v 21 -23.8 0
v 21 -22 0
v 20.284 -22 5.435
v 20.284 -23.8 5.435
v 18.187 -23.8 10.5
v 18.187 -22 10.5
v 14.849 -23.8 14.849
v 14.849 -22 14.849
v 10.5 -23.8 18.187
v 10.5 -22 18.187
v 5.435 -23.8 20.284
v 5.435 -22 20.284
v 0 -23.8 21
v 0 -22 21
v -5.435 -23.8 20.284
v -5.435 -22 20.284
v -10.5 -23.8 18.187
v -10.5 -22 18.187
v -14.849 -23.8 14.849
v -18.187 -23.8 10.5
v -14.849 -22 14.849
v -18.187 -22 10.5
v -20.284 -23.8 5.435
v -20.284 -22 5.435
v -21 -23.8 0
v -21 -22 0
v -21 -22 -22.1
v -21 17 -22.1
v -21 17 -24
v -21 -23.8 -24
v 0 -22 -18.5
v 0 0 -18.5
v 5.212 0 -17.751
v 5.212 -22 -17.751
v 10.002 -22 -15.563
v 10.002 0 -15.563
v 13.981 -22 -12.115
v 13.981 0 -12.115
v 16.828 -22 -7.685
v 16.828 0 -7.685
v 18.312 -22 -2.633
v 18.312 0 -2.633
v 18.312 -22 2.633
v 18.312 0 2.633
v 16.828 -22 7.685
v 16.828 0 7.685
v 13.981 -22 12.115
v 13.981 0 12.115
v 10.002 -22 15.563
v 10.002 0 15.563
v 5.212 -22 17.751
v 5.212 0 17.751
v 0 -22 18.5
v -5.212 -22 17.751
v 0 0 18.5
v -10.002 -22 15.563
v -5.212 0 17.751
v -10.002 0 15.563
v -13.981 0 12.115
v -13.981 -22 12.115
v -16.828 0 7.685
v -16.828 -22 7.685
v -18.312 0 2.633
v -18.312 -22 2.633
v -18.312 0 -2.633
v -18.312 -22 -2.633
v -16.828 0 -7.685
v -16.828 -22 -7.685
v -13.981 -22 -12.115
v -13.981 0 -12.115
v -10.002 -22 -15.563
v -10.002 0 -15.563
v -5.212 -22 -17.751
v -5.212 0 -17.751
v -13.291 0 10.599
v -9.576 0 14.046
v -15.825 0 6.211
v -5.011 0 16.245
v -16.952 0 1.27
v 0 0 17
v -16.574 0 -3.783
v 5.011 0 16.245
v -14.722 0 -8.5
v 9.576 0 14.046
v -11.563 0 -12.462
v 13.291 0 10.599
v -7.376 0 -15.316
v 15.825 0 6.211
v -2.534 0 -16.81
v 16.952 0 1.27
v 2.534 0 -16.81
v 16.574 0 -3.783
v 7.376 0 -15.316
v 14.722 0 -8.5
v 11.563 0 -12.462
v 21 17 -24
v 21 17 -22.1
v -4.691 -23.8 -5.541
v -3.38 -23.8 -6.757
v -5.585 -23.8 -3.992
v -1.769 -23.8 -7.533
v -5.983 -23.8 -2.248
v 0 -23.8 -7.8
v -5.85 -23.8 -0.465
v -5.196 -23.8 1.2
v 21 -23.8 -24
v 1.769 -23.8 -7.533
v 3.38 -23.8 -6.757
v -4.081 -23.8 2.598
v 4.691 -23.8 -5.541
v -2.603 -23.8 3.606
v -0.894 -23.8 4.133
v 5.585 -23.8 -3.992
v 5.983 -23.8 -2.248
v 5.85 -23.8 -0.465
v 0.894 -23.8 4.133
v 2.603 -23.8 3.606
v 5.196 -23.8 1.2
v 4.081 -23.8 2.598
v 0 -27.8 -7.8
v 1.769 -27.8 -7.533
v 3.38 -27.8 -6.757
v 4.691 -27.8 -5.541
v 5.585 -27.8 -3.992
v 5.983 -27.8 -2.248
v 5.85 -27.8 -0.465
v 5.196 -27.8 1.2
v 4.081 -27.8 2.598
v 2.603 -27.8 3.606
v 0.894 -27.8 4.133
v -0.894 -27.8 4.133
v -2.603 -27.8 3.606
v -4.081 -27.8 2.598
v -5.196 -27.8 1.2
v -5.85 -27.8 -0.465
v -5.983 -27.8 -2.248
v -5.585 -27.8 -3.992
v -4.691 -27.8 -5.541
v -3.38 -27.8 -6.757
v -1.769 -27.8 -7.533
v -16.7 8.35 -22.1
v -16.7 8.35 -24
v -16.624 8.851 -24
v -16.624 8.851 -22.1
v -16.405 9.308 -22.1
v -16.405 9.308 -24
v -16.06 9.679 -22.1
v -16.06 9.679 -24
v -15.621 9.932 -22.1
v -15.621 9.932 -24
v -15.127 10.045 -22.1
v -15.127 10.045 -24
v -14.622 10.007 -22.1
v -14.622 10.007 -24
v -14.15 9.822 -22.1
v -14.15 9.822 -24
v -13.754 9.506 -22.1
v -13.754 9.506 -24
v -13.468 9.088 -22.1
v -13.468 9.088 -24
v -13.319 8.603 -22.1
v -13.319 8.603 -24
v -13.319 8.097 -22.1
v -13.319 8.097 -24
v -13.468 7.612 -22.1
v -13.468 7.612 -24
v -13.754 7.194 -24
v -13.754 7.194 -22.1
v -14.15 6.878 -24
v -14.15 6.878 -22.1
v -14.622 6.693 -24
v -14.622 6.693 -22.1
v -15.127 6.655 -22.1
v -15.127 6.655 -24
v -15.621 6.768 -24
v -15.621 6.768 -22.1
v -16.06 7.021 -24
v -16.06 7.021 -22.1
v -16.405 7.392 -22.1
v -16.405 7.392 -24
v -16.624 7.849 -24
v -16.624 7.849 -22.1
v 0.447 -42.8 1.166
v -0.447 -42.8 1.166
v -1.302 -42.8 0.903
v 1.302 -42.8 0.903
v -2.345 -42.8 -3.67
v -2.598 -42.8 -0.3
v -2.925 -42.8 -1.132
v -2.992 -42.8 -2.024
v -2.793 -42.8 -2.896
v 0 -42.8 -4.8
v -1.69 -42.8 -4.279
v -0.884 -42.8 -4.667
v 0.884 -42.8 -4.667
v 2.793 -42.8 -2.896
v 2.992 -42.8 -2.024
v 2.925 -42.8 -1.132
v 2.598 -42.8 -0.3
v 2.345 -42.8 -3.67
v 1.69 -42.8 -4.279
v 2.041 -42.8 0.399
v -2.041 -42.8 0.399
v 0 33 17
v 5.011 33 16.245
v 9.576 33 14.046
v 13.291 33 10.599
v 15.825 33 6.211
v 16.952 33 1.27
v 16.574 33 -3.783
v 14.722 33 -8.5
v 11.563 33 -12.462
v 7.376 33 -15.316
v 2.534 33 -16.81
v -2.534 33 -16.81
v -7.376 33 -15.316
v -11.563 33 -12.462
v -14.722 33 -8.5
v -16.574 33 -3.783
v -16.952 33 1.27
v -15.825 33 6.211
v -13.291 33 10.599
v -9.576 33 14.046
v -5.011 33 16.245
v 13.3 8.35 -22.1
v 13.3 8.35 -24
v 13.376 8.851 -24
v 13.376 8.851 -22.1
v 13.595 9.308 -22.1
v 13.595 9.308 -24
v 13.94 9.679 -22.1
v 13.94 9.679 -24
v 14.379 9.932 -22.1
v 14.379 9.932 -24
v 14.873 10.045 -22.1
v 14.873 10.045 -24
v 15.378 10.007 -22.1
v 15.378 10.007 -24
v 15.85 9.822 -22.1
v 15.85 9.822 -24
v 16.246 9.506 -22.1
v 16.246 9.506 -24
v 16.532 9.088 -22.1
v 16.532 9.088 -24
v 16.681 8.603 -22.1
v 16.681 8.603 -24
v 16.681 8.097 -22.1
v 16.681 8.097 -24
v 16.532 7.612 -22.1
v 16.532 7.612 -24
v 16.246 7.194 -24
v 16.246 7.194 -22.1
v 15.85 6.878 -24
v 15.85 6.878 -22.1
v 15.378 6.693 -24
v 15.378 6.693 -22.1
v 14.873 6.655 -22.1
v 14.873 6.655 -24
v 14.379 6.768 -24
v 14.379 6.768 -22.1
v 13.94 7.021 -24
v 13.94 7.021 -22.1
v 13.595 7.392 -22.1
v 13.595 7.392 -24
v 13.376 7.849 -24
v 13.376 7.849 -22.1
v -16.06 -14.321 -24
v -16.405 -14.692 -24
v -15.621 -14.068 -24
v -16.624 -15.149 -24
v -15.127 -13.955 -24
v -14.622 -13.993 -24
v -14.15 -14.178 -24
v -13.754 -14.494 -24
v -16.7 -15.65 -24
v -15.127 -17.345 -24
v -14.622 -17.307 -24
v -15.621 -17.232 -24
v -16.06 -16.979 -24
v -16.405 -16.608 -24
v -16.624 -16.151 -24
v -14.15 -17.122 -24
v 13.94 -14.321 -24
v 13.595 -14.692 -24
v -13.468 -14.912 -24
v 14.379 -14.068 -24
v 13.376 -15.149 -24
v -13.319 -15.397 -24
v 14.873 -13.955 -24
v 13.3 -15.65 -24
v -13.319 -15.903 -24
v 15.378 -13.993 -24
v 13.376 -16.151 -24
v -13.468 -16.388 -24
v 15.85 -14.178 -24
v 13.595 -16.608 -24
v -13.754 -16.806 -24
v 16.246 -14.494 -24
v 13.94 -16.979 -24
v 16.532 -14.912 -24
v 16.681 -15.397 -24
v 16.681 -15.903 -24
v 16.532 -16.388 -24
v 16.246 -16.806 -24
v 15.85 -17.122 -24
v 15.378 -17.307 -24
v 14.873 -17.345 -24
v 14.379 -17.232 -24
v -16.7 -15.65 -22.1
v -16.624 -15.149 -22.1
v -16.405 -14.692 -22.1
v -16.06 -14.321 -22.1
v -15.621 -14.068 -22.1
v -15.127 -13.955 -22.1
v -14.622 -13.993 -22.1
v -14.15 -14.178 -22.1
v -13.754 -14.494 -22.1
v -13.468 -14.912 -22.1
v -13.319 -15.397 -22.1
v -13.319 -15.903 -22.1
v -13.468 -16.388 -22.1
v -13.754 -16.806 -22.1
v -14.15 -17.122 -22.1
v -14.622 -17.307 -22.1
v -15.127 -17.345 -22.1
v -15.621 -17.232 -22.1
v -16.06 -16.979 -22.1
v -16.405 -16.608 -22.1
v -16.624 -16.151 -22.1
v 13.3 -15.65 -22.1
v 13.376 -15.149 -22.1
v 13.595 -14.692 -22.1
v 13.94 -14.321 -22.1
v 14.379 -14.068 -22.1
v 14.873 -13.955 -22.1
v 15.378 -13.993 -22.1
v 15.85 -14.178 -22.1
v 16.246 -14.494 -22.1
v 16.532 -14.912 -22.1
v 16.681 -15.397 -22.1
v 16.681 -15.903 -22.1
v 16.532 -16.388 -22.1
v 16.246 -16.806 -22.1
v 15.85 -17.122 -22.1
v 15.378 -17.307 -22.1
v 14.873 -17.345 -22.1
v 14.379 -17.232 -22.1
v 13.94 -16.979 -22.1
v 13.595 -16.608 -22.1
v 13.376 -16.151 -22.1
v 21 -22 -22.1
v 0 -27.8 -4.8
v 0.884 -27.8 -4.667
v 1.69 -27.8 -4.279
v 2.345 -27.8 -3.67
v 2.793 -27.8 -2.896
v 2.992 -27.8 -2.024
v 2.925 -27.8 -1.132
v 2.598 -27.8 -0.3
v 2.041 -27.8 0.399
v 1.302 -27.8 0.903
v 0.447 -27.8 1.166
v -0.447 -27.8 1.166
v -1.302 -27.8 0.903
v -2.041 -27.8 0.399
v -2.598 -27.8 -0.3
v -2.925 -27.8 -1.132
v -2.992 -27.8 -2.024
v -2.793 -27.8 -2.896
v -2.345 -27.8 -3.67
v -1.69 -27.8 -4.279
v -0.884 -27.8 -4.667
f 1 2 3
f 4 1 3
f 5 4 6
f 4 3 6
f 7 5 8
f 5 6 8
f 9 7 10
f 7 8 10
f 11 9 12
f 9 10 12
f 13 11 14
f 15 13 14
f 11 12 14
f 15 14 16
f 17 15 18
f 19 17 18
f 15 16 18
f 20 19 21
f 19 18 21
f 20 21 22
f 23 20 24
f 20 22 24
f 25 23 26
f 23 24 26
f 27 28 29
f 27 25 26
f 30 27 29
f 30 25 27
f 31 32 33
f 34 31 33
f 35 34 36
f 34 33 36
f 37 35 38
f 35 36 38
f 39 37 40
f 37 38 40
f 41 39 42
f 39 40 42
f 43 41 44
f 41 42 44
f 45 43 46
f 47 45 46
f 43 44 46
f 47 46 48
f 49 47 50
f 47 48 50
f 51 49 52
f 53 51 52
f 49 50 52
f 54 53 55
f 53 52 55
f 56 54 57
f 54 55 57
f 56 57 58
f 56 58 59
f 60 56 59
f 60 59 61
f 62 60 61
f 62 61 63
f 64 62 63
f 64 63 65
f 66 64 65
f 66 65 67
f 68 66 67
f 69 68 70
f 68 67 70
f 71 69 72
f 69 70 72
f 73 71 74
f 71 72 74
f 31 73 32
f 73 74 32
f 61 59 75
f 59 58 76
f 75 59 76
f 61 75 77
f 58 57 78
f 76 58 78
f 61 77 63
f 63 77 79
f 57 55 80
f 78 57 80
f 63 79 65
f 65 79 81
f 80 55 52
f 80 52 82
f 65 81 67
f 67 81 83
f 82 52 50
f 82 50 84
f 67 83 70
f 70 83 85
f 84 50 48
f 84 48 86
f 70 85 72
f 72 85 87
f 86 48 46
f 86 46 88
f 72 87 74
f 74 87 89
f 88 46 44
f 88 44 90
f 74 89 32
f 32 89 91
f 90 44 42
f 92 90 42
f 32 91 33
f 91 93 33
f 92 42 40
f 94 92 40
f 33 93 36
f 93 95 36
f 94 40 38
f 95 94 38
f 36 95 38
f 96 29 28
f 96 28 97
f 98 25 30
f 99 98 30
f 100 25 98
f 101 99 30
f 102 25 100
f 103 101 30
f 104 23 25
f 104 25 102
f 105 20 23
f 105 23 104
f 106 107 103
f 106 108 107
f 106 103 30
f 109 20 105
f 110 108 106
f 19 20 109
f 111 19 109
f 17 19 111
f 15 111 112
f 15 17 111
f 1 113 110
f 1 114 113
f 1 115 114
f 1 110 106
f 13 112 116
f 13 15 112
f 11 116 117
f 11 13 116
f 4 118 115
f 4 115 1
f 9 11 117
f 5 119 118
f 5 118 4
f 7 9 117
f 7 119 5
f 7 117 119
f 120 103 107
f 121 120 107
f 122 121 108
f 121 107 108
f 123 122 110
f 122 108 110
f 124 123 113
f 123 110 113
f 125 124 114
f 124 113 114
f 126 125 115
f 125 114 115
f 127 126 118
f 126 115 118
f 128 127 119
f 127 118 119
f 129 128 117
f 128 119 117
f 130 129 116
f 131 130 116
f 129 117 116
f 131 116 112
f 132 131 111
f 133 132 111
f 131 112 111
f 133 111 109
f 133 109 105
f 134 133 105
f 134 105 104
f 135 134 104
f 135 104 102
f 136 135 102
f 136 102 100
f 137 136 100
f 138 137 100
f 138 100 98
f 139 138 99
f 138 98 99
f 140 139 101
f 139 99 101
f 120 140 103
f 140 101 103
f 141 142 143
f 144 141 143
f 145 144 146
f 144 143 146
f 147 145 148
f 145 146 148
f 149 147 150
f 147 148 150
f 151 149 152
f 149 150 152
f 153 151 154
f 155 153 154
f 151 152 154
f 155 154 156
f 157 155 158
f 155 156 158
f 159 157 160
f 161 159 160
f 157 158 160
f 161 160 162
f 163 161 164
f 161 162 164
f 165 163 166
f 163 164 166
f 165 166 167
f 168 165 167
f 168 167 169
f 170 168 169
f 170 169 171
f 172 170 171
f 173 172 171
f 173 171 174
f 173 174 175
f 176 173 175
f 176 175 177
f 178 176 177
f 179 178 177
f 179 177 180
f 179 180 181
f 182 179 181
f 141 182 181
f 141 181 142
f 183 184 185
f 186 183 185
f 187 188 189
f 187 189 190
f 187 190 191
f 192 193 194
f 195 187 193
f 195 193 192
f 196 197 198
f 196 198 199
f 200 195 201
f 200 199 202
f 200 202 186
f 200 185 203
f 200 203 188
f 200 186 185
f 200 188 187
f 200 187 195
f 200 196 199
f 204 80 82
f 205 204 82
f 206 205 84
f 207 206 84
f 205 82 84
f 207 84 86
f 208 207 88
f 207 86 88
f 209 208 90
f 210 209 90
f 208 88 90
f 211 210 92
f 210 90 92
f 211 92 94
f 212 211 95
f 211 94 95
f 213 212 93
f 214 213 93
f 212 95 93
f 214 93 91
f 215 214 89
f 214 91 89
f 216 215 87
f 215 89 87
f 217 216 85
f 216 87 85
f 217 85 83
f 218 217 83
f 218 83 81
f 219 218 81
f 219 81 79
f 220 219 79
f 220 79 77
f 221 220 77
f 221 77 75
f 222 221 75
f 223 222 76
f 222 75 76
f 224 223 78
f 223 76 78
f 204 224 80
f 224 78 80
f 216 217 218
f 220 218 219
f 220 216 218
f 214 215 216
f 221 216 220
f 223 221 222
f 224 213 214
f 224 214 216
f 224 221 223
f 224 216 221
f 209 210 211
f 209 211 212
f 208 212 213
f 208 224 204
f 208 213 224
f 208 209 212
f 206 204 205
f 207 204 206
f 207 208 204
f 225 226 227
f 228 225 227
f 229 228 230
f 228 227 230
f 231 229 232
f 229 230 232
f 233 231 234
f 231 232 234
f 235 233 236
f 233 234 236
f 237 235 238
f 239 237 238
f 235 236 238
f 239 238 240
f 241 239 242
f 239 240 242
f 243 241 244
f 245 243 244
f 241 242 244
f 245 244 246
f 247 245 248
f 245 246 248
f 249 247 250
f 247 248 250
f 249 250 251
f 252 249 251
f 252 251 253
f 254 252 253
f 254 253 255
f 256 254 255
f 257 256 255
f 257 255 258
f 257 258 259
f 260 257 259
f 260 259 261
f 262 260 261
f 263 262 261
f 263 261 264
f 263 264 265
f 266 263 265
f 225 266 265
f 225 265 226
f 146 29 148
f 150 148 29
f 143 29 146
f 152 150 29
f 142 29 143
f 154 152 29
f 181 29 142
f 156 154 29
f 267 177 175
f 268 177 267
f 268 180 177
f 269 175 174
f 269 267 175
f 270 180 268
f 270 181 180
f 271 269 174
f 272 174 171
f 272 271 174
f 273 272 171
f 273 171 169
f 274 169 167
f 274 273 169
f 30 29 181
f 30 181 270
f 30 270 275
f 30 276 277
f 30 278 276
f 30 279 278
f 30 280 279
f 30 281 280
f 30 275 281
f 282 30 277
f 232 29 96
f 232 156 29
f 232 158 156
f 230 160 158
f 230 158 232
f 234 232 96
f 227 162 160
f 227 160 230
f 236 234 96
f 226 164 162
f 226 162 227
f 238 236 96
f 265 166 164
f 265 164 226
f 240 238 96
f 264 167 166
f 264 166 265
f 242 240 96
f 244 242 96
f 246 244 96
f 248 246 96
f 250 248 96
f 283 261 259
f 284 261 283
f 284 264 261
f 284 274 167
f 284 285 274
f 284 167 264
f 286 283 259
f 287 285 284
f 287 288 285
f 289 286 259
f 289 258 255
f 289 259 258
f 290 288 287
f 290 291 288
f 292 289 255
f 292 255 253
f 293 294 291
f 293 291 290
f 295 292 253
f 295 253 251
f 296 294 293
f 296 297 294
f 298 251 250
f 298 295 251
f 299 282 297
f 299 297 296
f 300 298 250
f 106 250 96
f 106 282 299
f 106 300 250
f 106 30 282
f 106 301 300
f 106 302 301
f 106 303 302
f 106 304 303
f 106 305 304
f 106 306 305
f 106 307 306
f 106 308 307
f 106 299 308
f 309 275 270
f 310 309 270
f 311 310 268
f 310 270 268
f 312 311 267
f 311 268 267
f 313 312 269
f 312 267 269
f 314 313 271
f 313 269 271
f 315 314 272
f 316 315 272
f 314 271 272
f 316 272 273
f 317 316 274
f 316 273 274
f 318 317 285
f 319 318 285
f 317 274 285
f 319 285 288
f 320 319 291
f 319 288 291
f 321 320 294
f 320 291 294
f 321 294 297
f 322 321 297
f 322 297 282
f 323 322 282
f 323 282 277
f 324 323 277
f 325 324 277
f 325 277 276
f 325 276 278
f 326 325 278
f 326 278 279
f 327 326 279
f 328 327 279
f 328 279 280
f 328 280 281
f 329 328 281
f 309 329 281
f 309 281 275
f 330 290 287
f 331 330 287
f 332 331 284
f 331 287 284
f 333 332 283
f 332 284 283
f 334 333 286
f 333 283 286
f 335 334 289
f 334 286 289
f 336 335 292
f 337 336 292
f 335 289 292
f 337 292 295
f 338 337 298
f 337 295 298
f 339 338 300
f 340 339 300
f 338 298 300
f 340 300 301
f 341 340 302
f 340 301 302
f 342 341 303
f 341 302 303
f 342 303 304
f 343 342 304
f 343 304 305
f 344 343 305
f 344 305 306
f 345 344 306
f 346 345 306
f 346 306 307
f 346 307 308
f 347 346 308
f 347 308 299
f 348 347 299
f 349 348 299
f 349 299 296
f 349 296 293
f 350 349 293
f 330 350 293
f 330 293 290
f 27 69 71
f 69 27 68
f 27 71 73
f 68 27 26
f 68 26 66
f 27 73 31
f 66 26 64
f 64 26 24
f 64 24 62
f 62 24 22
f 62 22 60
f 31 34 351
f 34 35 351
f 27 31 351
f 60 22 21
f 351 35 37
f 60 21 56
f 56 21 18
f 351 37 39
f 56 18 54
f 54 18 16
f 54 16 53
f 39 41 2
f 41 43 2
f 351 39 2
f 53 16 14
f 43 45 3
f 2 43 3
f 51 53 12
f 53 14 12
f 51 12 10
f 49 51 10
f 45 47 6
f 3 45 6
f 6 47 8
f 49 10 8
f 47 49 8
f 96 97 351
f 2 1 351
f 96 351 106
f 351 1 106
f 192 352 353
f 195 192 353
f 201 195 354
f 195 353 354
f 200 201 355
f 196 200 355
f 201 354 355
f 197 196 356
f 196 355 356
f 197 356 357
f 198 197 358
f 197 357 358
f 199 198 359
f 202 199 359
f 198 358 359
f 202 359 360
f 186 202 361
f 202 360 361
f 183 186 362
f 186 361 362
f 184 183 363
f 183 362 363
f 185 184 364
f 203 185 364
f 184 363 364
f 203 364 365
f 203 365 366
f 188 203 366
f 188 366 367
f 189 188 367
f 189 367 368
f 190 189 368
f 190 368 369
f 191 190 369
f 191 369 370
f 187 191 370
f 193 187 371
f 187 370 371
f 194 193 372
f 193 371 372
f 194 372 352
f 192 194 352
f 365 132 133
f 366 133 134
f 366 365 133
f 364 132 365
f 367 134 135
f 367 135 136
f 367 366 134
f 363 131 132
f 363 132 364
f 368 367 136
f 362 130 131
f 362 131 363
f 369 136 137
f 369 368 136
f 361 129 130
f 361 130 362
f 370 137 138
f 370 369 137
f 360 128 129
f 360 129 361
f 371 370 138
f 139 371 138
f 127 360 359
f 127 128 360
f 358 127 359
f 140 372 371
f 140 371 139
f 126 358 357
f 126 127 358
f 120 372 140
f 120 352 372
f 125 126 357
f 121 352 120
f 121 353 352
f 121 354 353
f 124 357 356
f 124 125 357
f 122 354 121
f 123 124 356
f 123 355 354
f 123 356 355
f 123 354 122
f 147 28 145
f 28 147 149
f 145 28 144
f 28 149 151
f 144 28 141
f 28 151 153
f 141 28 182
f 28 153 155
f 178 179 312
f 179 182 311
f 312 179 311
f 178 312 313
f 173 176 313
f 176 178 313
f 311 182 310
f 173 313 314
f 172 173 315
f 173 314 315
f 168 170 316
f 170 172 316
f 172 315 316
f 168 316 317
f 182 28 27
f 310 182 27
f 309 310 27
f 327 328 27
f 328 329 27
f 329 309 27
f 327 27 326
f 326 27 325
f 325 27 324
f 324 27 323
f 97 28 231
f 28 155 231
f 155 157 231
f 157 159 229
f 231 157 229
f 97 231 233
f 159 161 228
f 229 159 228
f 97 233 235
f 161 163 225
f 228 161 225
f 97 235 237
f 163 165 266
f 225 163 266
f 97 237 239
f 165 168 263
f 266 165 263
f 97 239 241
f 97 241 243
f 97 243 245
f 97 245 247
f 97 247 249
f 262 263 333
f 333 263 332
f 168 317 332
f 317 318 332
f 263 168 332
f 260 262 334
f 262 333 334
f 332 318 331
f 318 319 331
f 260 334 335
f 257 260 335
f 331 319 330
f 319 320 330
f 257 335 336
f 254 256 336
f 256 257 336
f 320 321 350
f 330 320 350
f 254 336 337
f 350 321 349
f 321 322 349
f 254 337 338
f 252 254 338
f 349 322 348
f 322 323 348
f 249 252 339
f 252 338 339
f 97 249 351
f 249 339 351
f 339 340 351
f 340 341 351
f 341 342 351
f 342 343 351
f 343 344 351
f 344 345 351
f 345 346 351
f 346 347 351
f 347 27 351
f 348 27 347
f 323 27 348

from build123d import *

# Parameters (mm, degrees)
SKETCH_1_R          = 17
EXTRUDE_1_DEPTH     = 33
SKETCH_2_R          = 18.5
EXTRUDE_2_DEPTH     = 22
EXTRUDE_3_DEPTH     = 1.8
SKETCH_4_W          = 42
SKETCH_4_H          = 1.9
EXTRUDE_4_DEPTH     = 39
SKETCH_5_R          = 6
EXTRUDE_5_DEPTH     = 4
SKETCH_6_R          = 3
EXTRUDE_6_DEPTH     = 15
CUT_EXTRUDE_1_REACH = 67.558
SKETCH_7_R          = 1.7


with BuildPart() as part:
    # 草图1 → 凸台-拉伸1 (new body)
    with BuildSketch(Plane(origin=(0, 0, 0), x_dir=(1, 0, 0), z_dir=(0, 1, 0))):
        with Locations(Location((0, 0, 0), (0, 0, 270))):
            Circle(SKETCH_1_R)
    extrude(amount=EXTRUDE_1_DEPTH)

    # 草图2 → 凸台-拉伸2 (add)
    with BuildSketch(Plane.XZ):
        with Locations(Location((0, 0, 0), (0, 0, 270))):
            Circle(SKETCH_2_R)
    extrude(amount=EXTRUDE_2_DEPTH)

    # 草图3 → 凸台-拉伸3 (add)
    with BuildSketch(Plane.XZ.offset(22)):
        with BuildLine():
            Line((-21, 0), (-21, -24))
            Line((-21, -24), (21, -24))
            Line((21, -24), (21, 0))
            ThreePointArc((21, 0), (0, 21), (-21, 0))
        make_face()
    extrude(amount=EXTRUDE_3_DEPTH)

    # 草图4 → 凸台-拉伸4 (add)
    with BuildSketch(Plane(origin=(0, -22, 0), x_dir=(1, 0, 0), z_dir=(0, 1, 0))):
        with Locations((0, 23.05)):
            Rectangle(SKETCH_4_W, SKETCH_4_H)
    extrude(amount=EXTRUDE_4_DEPTH)

    # 草图5 → 凸台-拉伸5 (add)
    with BuildSketch(Plane.XZ.offset(23.8)):
        with Locations(Location((0, -1.8, 0), (0, 0, 270))):
            Circle(SKETCH_5_R)
    extrude(amount=EXTRUDE_5_DEPTH)

    # 草图6 → 凸台-拉伸6 (add)
    with BuildSketch(Plane.XZ.offset(27.8)):
        with Locations(Location((0, -1.8, 0), (0, 0, 270))):
            Circle(SKETCH_6_R)
    extrude(amount=EXTRUDE_6_DEPTH)

    # 草图7 → 切除-拉伸1 (cut, up to next)
    with BuildSketch(Plane(origin=(0, 0, -24), x_dir=(-1, 0, 0), z_dir=(0, 0, -1)), mode=Mode.PRIVATE) as cut_extrude_1_sk1:
        with Locations((-15, 8.35)):
            Circle(SKETCH_7_R)
    cut_extrude_1_tool1 = extrude(cut_extrude_1_sk1.sketch, amount=-CUT_EXTRUDE_1_REACH, mode=Mode.PRIVATE) & part.part
    # 草图7 → 切除-拉伸1 (cut, up to next)
    with BuildSketch(Plane(origin=(0, 0, -24), x_dir=(-1, 0, 0), z_dir=(0, 0, -1)), mode=Mode.PRIVATE) as cut_extrude_1_sk2:
        with Locations((-15, -15.65)):
            Circle(SKETCH_7_R)
    cut_extrude_1_tool2 = extrude(cut_extrude_1_sk2.sketch, amount=-CUT_EXTRUDE_1_REACH, mode=Mode.PRIVATE) & part.part
    # 草图7 → 切除-拉伸1 (cut, up to next)
    with BuildSketch(Plane(origin=(0, 0, -24), x_dir=(-1, 0, 0), z_dir=(0, 0, -1)), mode=Mode.PRIVATE) as cut_extrude_1_sk3:
        with Locations((15, 8.35)):
            Circle(SKETCH_7_R)
    cut_extrude_1_tool3 = extrude(cut_extrude_1_sk3.sketch, amount=-CUT_EXTRUDE_1_REACH, mode=Mode.PRIVATE) & part.part
    # 草图7 → 切除-拉伸1 (cut, up to next)
    with BuildSketch(Plane(origin=(0, 0, -24), x_dir=(-1, 0, 0), z_dir=(0, 0, -1)), mode=Mode.PRIVATE) as cut_extrude_1_sk4:
        with Locations((15, -15.65)):
            Circle(SKETCH_7_R)
    cut_extrude_1_tool4 = extrude(cut_extrude_1_sk4.sketch, amount=-CUT_EXTRUDE_1_REACH, mode=Mode.PRIVATE) & part.part
    add(cut_extrude_1_tool1.solids().sort_by_distance((15, 8.35, -24))[0], mode=Mode.SUBTRACT)
    add(cut_extrude_1_tool2.solids().sort_by_distance((15, -15.65, -24))[0], mode=Mode.SUBTRACT)
    add(cut_extrude_1_tool3.solids().sort_by_distance((-15, 8.35, -24))[0], mode=Mode.SUBTRACT)
    add(cut_extrude_1_tool4.solids().sort_by_distance((-15, -15.65, -24))[0], mode=Mode.SUBTRACT)


solid = part.part
